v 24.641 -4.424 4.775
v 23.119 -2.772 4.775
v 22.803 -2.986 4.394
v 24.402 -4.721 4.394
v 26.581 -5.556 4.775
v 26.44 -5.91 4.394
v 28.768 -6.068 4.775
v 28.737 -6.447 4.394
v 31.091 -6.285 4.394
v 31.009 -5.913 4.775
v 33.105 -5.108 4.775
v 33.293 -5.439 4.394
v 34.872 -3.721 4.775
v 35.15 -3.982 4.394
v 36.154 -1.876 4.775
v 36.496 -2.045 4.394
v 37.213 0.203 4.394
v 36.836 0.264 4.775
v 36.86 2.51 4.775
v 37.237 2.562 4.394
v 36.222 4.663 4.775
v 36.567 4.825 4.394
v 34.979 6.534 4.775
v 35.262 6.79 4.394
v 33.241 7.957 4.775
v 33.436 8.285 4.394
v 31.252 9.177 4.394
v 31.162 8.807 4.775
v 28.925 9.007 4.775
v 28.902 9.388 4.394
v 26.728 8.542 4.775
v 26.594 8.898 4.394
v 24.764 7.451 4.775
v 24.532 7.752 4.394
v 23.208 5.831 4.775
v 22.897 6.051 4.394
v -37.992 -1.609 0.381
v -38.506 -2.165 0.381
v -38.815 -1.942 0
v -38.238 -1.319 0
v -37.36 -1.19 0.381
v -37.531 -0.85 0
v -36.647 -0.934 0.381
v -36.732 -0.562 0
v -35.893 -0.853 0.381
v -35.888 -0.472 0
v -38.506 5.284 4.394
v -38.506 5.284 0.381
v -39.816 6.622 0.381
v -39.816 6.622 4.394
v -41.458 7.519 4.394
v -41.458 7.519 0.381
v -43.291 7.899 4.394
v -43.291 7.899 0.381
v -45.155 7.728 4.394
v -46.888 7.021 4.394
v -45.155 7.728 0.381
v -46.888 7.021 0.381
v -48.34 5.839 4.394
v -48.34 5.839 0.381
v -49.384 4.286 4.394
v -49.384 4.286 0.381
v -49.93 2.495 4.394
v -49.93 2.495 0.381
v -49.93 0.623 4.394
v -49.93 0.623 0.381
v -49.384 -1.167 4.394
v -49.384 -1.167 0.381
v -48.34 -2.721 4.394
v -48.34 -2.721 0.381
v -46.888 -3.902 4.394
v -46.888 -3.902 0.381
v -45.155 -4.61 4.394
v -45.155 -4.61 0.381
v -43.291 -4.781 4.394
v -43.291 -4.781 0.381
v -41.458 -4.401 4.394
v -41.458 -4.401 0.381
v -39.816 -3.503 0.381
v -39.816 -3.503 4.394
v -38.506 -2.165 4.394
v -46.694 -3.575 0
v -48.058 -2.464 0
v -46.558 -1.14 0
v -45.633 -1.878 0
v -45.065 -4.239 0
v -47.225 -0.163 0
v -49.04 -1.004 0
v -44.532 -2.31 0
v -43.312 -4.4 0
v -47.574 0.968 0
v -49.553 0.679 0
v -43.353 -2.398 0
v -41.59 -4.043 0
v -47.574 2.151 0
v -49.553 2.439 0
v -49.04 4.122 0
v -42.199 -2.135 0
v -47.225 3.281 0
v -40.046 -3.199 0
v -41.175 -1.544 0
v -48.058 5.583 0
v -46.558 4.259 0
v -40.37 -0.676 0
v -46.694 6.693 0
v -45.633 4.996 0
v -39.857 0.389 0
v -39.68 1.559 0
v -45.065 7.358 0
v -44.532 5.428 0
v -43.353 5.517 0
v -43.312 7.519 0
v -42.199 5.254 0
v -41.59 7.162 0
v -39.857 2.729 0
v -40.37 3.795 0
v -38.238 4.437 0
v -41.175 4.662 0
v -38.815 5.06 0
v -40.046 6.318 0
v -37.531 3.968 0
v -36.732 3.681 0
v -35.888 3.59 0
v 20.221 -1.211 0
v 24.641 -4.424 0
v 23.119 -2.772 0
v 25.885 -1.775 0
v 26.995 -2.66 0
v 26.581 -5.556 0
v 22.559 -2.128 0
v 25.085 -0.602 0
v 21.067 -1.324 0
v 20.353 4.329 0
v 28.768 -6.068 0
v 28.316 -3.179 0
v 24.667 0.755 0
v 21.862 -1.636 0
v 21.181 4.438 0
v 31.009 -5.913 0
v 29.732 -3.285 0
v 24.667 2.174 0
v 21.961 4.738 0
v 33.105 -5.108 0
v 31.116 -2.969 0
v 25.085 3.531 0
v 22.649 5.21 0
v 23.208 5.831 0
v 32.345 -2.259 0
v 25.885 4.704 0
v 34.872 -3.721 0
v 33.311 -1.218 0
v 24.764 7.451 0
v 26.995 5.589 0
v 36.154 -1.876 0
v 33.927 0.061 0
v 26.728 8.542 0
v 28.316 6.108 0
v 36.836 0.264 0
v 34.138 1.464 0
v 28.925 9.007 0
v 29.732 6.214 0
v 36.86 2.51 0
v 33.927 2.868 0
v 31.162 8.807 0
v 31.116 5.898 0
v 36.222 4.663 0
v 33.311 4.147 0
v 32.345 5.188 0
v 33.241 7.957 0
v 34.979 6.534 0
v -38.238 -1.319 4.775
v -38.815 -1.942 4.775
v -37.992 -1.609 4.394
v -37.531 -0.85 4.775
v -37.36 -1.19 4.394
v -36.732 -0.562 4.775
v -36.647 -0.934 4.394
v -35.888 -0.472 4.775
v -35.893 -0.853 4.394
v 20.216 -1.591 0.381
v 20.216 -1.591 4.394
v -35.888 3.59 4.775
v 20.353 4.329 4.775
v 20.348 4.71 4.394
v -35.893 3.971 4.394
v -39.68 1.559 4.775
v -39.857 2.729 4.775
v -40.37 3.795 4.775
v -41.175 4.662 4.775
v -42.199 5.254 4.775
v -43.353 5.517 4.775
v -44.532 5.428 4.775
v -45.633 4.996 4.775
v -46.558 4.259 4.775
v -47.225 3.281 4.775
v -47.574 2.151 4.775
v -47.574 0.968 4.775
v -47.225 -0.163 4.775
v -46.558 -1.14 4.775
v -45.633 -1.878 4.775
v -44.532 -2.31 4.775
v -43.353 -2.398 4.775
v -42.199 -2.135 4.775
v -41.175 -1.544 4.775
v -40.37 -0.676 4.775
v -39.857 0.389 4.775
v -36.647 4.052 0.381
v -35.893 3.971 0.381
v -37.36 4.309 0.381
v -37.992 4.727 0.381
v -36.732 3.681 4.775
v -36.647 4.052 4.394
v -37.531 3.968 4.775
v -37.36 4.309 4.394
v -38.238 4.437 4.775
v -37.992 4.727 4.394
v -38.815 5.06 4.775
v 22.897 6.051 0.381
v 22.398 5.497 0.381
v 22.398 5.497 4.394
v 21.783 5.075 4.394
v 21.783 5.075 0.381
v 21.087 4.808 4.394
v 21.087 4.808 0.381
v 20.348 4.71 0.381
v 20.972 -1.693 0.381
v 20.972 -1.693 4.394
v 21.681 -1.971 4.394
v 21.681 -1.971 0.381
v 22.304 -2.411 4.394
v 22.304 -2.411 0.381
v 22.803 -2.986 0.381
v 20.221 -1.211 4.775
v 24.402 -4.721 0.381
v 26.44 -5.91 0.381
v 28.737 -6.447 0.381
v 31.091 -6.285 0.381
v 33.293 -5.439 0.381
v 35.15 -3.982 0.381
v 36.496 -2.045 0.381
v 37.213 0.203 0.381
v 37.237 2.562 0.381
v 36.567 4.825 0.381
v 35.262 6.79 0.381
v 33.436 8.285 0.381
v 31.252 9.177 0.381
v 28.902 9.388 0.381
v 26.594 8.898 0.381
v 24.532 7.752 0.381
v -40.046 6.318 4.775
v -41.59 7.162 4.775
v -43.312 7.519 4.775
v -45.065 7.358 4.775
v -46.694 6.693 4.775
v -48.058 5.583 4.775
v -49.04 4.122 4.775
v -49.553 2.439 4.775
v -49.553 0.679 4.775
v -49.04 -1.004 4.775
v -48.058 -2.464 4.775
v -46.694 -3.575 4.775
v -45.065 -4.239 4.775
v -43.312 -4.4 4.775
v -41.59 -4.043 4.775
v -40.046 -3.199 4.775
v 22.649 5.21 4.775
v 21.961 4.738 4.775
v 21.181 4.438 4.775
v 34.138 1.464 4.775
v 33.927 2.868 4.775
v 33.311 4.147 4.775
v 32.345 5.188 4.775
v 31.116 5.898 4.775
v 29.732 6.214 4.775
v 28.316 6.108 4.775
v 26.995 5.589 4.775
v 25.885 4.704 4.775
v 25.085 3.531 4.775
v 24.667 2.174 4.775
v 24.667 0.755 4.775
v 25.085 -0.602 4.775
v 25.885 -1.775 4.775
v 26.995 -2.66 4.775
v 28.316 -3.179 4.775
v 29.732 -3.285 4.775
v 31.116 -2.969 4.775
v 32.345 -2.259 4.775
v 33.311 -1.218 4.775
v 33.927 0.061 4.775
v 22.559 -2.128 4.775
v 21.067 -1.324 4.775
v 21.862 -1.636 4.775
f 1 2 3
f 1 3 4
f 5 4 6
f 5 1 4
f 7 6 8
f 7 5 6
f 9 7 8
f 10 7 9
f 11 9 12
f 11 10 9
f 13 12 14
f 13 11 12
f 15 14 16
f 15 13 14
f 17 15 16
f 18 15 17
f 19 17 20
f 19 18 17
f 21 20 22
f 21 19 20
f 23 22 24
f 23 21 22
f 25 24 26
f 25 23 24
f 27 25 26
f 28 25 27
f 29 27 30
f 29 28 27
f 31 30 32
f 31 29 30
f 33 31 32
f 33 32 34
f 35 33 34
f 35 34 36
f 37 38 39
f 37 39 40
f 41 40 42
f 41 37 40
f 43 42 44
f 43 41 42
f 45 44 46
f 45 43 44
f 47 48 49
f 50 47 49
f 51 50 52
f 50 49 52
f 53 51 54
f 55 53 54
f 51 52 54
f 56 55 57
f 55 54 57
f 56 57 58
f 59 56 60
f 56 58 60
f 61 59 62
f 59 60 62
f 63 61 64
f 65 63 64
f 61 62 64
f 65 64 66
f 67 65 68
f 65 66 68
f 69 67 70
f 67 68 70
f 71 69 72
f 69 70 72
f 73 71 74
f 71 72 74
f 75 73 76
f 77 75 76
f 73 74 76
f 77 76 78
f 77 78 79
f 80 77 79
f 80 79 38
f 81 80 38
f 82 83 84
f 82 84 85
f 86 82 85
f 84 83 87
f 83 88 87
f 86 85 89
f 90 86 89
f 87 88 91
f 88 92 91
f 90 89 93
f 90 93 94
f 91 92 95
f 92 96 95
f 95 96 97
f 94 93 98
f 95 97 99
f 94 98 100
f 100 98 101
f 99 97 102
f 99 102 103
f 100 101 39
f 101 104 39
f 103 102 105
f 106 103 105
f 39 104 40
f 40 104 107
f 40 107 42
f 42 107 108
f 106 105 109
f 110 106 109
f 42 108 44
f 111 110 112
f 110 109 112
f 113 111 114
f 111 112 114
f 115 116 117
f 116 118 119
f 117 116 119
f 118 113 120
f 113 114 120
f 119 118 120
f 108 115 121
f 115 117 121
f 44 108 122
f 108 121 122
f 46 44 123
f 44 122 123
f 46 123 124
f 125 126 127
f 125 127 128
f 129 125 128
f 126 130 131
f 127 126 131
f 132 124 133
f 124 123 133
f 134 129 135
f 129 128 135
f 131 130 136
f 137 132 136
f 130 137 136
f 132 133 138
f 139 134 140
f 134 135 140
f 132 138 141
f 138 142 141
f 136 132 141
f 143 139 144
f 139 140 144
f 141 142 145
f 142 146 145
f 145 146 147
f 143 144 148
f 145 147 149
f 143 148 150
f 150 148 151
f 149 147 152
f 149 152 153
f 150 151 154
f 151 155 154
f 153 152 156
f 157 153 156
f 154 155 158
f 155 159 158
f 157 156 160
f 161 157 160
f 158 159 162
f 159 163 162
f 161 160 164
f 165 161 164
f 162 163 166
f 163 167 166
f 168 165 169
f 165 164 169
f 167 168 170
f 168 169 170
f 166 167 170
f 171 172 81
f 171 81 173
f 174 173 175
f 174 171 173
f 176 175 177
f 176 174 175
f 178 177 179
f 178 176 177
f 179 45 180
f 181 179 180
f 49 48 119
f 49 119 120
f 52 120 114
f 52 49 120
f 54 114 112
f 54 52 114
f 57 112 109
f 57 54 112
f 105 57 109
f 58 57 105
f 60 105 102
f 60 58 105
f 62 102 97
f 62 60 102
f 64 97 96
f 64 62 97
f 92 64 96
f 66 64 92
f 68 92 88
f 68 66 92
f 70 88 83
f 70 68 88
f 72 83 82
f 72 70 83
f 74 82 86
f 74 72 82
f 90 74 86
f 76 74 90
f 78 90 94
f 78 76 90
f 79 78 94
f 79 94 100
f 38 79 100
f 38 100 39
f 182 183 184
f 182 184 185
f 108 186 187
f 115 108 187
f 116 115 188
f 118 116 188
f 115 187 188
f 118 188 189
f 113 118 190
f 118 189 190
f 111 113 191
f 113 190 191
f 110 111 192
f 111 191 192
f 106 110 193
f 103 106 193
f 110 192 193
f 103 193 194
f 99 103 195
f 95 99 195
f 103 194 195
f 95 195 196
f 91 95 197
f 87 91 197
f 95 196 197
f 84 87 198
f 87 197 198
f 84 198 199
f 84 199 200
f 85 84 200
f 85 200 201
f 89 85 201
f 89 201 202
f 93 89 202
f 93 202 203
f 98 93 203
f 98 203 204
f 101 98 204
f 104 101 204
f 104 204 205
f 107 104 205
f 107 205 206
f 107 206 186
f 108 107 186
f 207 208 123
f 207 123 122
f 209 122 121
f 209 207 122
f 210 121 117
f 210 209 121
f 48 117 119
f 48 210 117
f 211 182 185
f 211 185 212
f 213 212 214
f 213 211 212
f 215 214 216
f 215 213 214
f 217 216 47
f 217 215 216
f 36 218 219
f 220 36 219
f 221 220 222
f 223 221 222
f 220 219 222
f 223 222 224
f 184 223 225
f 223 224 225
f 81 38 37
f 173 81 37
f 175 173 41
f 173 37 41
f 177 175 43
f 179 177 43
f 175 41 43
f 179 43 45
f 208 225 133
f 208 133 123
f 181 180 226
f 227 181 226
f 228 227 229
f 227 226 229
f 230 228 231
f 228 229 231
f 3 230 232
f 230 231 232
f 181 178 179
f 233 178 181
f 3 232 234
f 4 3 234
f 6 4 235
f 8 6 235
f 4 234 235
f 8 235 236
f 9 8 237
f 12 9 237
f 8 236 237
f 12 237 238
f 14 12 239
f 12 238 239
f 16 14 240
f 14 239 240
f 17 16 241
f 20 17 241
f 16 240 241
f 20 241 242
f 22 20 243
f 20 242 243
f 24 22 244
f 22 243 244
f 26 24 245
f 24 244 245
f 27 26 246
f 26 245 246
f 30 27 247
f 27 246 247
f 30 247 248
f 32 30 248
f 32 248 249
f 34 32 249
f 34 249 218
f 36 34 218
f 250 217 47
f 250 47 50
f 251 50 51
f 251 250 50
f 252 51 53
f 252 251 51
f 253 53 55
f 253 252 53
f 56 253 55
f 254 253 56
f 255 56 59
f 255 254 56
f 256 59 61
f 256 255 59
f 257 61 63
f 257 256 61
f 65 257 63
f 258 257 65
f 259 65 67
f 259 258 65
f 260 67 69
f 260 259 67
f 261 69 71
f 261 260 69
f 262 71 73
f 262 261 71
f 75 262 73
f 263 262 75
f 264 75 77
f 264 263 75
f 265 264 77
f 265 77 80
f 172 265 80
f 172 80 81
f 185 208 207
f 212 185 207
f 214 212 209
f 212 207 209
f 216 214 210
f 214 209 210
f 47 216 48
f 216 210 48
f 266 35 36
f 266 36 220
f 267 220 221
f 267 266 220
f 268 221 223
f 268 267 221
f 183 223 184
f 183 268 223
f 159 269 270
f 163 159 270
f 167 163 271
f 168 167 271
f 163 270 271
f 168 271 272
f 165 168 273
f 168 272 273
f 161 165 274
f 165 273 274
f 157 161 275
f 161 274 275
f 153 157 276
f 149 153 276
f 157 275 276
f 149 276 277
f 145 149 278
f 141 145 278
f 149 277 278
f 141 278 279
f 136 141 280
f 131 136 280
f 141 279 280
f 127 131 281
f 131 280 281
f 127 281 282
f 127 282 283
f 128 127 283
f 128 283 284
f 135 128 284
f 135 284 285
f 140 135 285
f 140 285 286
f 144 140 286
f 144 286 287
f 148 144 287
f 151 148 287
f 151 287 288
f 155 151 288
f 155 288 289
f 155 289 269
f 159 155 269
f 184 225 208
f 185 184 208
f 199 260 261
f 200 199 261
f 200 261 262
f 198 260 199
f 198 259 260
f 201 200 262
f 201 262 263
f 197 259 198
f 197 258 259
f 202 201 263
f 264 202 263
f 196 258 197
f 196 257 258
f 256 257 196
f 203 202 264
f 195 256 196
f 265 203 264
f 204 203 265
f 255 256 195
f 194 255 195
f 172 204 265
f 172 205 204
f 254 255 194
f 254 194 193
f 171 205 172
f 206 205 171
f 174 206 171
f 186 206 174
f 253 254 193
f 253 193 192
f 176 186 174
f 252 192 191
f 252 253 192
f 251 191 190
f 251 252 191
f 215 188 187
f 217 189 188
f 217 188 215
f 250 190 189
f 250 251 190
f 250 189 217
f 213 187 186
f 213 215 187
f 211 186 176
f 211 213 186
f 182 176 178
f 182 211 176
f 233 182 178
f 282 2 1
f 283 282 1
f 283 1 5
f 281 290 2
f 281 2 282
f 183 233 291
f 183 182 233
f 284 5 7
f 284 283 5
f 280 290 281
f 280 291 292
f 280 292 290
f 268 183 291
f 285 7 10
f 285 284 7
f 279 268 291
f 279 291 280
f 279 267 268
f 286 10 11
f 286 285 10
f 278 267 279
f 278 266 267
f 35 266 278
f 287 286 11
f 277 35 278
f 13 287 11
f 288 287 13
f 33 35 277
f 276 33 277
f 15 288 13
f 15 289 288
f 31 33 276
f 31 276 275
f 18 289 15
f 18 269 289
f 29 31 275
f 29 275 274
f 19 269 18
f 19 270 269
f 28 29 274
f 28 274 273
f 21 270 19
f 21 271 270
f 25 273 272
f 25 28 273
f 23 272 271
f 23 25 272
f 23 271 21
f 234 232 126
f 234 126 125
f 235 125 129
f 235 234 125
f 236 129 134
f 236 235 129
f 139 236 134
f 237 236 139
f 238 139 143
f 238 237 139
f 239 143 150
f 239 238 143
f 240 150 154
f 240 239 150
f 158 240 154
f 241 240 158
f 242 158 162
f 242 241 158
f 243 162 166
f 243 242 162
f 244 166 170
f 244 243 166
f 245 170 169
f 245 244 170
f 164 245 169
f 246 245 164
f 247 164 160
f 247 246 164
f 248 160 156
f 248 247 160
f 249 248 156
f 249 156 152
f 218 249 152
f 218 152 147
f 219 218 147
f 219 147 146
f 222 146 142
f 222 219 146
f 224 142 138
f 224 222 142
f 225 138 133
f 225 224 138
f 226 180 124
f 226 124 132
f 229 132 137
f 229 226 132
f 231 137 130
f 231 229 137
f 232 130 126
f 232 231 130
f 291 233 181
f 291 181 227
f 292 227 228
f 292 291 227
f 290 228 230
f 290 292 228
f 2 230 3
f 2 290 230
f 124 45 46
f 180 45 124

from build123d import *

# Parameters (mm, degrees)
F1_DEPTH = 4.7752
F2_R     = 3.96875
F3_DEPTH = 4.7762
F4_R     = 4.7625
F5_DEPTH = 4.7762
F6_SIZE  = 0.381
F7_SIZE  = 0.381


with BuildPart() as f1:
    # F0 (on Top) → F1 (new body)
    with BuildSketch(Plane.XY):
        with BuildLine():
            ThreePointArc((20.216247, -1.591479), (21.680928, -1.971354), (22.803448, -2.986018))
            ThreePointArc((22.803448, -2.986018), (37.312981, 1.381884), (22.897449, 6.050669))
            ThreePointArc((22.897449, 6.050669), (21.783346, 5.074773), (20.347779, 4.710432))
            Line((20.347779, 4.710432), (-35.892979, 3.971447))
            ThreePointArc((-35.892979, 3.971447), (-37.359656, 4.308902), (-38.506159, 5.283865))
            ThreePointArc((-38.506159, 5.283865), (-49.999089, 1.559265), (-38.506178, -2.165395))
            ThreePointArc((-38.506178, -2.165395), (-37.359647, -1.190426), (-35.892939, -0.852992))
            Line((-35.892939, -0.852992), (20.216247, -1.591479))
        make_face()
    extrude(amount=F1_DEPTH)

    # F2 (on face) → F3 (cut, through all)
    with BuildSketch(Plane.XY.offset(4.7752)):
        with Locations((-43.649089, 1.559248)):
            Circle(F2_R)
    extrude(amount=-F3_DEPTH, mode=Mode.SUBTRACT)

    # F4 (on face) → F5 (cut, through all)
    with BuildSketch(Plane.XY.offset(4.7752)):
        with Locations((29.375911, 1.464447)):
            Circle(F4_R)
    extrude(amount=-F5_DEPTH, mode=Mode.SUBTRACT)

    # F6
    f6_edges = [f1.edges().sort_by_distance(p)[0] for p in [
        (37.312981, 1.381884, 4.7752),
        (21.783346, 5.074773, 4.7752),
        (-7.7726, 4.34094, 4.7752),
        (21.680928, -1.971354, 4.7752),
        (-7.838346, -1.222235, 4.7752),
        (-37.359656, 4.308902, 4.7752),
        (-49.999089, 1.559265, 4.7752),
        (-37.359647, -1.190426, 4.7752),
    ]]
    chamfer(f6_edges, length=F6_SIZE)

    # F7
    f7_edges = [f1.edges().sort_by_distance(p)[0] for p in [
        (-49.999089, 1.559265, 0),
        (-37.359647, -1.190426, 0),
        (-37.359656, 4.308902, 0),
        (-7.838346, -1.222235, 0),
        (-7.7726, 4.34094, 0),
        (21.680928, -1.971354, 0),
        (37.312981, 1.381884, 0),
        (21.783346, 5.074773, 0),
    ]]
    chamfer(f7_edges, length=F7_SIZE)


solid = f1.part
